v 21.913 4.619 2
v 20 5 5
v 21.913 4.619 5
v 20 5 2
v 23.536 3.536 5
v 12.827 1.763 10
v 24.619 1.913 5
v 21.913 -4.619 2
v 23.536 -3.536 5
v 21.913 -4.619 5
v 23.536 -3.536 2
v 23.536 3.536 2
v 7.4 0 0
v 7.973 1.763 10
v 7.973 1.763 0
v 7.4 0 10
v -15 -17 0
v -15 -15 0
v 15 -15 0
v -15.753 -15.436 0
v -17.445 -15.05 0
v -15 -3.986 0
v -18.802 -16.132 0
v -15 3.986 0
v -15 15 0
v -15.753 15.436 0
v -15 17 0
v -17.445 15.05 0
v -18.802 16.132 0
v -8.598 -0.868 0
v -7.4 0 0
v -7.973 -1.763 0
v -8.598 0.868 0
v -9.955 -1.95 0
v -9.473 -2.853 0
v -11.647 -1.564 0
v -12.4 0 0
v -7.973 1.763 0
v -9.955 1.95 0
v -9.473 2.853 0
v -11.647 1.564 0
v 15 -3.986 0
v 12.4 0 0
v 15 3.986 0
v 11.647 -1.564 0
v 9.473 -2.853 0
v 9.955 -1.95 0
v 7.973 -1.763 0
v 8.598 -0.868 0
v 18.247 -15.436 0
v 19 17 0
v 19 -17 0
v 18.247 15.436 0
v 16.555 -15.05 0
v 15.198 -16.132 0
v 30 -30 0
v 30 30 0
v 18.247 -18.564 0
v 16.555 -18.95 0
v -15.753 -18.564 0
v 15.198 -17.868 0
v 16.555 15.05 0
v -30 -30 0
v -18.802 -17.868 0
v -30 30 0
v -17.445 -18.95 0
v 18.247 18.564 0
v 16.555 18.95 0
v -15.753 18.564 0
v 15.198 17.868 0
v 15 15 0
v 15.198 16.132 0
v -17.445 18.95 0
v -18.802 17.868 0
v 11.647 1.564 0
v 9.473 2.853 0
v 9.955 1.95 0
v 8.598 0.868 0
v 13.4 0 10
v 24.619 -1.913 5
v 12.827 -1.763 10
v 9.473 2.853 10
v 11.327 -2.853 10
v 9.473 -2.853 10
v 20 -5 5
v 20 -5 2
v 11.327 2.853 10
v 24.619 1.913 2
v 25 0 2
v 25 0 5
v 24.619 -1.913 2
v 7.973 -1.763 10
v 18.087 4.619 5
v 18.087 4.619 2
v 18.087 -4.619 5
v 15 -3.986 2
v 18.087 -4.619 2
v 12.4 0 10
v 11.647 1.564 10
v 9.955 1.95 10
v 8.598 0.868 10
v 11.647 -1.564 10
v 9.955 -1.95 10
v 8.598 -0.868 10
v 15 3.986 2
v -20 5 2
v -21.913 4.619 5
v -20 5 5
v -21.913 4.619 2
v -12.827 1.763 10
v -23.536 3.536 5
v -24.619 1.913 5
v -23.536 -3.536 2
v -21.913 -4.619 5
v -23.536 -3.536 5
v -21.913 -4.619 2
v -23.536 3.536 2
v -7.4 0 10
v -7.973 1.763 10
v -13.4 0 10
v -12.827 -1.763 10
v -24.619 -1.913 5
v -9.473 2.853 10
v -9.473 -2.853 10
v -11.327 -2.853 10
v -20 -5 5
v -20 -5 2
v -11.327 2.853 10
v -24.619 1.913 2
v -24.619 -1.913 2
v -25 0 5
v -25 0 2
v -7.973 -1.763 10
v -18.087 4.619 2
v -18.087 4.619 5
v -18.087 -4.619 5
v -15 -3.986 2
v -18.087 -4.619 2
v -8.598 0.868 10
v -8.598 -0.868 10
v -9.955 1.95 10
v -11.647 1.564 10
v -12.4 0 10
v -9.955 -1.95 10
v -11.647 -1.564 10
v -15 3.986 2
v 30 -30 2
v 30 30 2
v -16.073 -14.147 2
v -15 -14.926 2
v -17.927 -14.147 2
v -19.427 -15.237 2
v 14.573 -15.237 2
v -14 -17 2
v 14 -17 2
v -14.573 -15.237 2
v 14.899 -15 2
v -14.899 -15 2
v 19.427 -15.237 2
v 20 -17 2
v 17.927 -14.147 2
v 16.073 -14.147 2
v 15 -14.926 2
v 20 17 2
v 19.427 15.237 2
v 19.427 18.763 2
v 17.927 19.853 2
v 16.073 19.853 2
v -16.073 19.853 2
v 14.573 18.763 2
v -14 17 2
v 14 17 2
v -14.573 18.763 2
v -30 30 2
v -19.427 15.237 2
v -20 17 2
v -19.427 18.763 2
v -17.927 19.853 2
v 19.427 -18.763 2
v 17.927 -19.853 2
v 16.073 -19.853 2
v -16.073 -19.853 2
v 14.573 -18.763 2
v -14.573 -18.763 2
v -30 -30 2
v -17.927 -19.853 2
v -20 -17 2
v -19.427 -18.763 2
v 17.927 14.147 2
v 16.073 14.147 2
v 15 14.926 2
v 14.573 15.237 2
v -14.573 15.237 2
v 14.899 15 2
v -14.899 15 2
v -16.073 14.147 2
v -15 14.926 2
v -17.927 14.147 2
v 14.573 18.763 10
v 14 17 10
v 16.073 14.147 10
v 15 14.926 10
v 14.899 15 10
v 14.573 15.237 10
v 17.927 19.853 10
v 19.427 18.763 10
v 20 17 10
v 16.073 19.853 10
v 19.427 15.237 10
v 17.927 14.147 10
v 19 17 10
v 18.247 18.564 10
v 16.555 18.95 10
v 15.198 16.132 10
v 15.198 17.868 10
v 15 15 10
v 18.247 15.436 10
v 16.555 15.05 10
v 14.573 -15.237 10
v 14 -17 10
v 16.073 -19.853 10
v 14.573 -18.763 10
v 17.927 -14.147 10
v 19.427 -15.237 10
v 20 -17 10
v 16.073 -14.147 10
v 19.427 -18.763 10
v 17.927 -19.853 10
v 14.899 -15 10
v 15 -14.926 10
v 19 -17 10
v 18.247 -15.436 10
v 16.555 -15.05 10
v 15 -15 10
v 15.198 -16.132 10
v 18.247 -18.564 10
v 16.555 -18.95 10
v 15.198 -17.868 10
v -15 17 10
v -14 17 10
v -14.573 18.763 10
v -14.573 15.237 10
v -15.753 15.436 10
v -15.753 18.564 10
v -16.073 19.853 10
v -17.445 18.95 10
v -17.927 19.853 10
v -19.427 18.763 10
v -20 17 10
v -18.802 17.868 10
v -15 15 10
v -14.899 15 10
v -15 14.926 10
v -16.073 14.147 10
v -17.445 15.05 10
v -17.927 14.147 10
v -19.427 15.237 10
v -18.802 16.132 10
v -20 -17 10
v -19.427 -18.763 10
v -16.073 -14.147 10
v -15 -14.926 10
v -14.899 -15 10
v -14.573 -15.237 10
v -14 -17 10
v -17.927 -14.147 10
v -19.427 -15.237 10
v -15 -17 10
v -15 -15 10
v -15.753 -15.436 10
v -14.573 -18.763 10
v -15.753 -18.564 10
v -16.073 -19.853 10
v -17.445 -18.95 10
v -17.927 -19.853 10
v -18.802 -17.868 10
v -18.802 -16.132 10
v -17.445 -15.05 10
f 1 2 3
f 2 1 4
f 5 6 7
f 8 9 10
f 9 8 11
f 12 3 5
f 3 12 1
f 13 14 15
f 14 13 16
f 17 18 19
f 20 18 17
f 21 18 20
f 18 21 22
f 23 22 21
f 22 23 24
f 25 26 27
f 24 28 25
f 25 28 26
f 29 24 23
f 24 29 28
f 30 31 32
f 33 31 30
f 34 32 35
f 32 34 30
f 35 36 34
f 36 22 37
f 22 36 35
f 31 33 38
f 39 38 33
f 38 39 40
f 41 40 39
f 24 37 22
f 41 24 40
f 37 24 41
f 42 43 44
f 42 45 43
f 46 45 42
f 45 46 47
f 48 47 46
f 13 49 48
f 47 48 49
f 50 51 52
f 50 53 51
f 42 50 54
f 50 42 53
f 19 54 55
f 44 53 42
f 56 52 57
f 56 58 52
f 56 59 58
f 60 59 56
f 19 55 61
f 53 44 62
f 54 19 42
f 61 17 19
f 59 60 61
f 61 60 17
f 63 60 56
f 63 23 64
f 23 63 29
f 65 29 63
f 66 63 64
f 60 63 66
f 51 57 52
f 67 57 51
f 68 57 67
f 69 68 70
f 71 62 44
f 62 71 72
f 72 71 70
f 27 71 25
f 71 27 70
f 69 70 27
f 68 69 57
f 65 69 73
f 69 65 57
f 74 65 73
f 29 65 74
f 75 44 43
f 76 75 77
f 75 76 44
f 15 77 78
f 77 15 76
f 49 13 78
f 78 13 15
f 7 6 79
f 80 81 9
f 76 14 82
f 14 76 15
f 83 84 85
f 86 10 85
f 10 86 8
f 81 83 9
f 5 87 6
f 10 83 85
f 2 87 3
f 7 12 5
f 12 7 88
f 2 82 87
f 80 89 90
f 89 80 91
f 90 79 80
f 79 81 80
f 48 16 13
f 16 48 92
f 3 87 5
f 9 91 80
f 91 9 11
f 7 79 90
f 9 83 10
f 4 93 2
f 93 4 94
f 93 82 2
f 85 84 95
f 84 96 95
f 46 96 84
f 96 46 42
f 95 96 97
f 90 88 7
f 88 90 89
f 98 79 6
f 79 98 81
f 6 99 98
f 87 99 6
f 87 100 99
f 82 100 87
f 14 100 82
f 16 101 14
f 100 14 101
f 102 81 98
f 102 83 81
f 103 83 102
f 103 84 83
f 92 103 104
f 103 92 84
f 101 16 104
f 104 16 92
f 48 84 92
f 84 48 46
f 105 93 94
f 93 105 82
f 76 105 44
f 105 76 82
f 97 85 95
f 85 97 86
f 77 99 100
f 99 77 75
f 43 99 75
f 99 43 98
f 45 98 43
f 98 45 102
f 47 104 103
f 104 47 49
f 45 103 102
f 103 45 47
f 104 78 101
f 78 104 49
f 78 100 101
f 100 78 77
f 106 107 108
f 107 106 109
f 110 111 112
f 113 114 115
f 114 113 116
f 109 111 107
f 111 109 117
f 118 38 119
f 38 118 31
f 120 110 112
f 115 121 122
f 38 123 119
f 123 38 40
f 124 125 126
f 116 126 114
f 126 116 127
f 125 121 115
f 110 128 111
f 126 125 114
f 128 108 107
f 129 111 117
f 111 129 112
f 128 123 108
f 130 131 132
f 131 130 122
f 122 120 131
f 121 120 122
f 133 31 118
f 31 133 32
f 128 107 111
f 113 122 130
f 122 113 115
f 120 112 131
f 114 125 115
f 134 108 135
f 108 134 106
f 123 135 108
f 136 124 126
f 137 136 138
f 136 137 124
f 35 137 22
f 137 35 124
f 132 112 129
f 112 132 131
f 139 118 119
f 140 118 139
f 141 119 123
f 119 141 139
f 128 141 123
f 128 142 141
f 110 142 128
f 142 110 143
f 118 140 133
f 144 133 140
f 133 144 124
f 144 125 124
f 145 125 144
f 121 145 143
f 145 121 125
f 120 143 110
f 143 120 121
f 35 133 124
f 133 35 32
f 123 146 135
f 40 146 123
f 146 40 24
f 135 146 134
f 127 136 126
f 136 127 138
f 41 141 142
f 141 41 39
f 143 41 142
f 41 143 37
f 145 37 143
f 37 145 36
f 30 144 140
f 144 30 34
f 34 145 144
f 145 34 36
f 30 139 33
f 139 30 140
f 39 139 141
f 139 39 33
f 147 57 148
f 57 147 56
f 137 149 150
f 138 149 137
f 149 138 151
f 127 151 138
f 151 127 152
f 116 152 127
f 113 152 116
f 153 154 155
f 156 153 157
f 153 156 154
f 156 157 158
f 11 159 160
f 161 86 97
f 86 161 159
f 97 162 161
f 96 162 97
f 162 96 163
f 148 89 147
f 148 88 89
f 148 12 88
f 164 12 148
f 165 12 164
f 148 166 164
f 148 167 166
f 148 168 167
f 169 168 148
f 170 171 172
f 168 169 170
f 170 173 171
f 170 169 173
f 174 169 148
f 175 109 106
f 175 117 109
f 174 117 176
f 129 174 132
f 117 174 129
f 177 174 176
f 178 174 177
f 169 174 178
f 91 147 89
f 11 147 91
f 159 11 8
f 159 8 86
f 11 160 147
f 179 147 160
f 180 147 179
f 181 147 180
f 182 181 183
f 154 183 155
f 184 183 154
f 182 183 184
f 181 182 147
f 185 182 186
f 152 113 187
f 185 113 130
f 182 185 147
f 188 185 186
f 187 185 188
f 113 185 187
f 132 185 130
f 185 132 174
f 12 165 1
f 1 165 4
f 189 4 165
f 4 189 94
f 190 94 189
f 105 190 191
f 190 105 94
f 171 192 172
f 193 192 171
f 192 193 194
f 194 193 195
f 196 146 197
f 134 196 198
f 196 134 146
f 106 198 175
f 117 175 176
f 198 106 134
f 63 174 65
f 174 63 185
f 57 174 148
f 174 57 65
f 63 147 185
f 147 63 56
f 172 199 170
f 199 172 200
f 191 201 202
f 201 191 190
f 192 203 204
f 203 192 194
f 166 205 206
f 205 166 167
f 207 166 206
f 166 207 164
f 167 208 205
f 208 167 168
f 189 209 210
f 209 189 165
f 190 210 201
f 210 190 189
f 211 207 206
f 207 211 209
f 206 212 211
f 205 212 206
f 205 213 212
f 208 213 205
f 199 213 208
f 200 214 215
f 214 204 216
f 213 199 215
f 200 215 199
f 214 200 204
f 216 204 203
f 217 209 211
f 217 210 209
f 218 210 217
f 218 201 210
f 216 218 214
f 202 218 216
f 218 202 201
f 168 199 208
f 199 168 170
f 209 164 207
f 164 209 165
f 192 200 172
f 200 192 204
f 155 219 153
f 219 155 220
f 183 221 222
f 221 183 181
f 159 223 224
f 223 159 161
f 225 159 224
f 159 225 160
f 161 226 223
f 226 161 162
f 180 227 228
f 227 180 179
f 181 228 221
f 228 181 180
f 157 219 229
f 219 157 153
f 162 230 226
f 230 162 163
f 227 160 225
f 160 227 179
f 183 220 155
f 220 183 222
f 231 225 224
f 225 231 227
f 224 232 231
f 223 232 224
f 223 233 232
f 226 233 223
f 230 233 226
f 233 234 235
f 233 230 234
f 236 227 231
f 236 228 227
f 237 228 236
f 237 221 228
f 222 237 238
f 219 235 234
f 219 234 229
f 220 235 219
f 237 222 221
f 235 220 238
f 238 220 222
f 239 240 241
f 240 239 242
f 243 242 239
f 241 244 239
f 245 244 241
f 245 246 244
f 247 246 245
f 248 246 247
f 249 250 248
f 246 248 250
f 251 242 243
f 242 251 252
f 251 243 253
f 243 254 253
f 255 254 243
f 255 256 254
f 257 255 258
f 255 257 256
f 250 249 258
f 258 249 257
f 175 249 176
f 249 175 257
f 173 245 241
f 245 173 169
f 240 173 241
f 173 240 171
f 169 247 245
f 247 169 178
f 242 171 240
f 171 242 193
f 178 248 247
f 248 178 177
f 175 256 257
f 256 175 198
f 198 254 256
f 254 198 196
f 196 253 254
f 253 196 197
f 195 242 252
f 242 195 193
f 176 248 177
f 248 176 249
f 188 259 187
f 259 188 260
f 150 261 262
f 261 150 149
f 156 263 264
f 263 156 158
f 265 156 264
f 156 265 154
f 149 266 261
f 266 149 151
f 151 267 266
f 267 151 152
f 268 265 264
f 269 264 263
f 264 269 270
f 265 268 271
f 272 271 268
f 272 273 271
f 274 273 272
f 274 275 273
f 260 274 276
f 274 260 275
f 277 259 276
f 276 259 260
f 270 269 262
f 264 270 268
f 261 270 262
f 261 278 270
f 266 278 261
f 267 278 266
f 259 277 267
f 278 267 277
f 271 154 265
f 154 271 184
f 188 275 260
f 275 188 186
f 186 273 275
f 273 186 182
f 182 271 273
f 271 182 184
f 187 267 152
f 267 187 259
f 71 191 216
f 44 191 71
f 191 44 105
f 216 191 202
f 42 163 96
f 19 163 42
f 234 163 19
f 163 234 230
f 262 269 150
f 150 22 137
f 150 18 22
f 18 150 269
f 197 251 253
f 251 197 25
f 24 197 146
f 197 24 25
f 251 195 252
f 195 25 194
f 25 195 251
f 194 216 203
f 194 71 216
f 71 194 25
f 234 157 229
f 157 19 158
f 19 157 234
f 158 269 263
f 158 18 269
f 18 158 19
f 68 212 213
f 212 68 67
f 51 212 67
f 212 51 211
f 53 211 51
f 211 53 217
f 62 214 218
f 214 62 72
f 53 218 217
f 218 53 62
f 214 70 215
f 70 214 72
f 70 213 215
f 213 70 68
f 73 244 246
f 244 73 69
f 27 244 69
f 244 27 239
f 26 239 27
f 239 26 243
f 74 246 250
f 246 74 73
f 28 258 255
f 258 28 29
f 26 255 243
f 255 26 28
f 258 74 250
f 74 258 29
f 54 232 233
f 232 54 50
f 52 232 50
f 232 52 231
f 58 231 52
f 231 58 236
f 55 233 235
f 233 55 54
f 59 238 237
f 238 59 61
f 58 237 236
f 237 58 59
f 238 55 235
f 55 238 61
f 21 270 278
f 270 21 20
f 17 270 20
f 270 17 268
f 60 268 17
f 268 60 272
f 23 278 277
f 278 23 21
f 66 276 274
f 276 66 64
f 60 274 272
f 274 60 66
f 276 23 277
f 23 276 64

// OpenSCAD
//LUGS for camera v2 board
module lugs(){
difference(){
hull(){
translate([10.4,0,0]) cylinder(r=3,h=10);
translate([20,0,0]) cylinder(r=5,h=5);
}
translate([10.4,0,-50]) cylinder(r=2,h=100);
}
}
    
module boardmount2(depth=4,pi2=true) {
union(){
//FIRST LUGS FOR CAMERA BOARD; can comment out for HQ camera
if(pi2){

lugs();
mirror([1,0,0]){
    lugs();
}
}
//THEN PLATE FOR MOUNTING
difference(){
union(){
translate([-30,-30,0]) cube([60,60,2]);
//add lugs for HQ camera    
translate([17,17,0]) cylinder(r=3,h=10);
translate([17,-17,0]) cylinder(r=3,h=10);
translate([-17,17,0]) cylinder(r=3,h=10);
translate([-17,-17,0]) cylinder(r=3,h=10);    
}
translate([-15,-15,-50]) cube([30,30,100]); //space for camera
    //ADD HOLES FOR HQ camera
translate([17,17,-50]) cylinder(r=2,h=100);
translate([-17,17,-50]) cylinder(r=2,h=100);
translate([17,-17,-50]) cylinder(r=2,h=100);
translate([-17,-17,-50]) cylinder(r=2,h=100);


}
}

}




boardmount2(); 
//boardmount2(pi2=false);
